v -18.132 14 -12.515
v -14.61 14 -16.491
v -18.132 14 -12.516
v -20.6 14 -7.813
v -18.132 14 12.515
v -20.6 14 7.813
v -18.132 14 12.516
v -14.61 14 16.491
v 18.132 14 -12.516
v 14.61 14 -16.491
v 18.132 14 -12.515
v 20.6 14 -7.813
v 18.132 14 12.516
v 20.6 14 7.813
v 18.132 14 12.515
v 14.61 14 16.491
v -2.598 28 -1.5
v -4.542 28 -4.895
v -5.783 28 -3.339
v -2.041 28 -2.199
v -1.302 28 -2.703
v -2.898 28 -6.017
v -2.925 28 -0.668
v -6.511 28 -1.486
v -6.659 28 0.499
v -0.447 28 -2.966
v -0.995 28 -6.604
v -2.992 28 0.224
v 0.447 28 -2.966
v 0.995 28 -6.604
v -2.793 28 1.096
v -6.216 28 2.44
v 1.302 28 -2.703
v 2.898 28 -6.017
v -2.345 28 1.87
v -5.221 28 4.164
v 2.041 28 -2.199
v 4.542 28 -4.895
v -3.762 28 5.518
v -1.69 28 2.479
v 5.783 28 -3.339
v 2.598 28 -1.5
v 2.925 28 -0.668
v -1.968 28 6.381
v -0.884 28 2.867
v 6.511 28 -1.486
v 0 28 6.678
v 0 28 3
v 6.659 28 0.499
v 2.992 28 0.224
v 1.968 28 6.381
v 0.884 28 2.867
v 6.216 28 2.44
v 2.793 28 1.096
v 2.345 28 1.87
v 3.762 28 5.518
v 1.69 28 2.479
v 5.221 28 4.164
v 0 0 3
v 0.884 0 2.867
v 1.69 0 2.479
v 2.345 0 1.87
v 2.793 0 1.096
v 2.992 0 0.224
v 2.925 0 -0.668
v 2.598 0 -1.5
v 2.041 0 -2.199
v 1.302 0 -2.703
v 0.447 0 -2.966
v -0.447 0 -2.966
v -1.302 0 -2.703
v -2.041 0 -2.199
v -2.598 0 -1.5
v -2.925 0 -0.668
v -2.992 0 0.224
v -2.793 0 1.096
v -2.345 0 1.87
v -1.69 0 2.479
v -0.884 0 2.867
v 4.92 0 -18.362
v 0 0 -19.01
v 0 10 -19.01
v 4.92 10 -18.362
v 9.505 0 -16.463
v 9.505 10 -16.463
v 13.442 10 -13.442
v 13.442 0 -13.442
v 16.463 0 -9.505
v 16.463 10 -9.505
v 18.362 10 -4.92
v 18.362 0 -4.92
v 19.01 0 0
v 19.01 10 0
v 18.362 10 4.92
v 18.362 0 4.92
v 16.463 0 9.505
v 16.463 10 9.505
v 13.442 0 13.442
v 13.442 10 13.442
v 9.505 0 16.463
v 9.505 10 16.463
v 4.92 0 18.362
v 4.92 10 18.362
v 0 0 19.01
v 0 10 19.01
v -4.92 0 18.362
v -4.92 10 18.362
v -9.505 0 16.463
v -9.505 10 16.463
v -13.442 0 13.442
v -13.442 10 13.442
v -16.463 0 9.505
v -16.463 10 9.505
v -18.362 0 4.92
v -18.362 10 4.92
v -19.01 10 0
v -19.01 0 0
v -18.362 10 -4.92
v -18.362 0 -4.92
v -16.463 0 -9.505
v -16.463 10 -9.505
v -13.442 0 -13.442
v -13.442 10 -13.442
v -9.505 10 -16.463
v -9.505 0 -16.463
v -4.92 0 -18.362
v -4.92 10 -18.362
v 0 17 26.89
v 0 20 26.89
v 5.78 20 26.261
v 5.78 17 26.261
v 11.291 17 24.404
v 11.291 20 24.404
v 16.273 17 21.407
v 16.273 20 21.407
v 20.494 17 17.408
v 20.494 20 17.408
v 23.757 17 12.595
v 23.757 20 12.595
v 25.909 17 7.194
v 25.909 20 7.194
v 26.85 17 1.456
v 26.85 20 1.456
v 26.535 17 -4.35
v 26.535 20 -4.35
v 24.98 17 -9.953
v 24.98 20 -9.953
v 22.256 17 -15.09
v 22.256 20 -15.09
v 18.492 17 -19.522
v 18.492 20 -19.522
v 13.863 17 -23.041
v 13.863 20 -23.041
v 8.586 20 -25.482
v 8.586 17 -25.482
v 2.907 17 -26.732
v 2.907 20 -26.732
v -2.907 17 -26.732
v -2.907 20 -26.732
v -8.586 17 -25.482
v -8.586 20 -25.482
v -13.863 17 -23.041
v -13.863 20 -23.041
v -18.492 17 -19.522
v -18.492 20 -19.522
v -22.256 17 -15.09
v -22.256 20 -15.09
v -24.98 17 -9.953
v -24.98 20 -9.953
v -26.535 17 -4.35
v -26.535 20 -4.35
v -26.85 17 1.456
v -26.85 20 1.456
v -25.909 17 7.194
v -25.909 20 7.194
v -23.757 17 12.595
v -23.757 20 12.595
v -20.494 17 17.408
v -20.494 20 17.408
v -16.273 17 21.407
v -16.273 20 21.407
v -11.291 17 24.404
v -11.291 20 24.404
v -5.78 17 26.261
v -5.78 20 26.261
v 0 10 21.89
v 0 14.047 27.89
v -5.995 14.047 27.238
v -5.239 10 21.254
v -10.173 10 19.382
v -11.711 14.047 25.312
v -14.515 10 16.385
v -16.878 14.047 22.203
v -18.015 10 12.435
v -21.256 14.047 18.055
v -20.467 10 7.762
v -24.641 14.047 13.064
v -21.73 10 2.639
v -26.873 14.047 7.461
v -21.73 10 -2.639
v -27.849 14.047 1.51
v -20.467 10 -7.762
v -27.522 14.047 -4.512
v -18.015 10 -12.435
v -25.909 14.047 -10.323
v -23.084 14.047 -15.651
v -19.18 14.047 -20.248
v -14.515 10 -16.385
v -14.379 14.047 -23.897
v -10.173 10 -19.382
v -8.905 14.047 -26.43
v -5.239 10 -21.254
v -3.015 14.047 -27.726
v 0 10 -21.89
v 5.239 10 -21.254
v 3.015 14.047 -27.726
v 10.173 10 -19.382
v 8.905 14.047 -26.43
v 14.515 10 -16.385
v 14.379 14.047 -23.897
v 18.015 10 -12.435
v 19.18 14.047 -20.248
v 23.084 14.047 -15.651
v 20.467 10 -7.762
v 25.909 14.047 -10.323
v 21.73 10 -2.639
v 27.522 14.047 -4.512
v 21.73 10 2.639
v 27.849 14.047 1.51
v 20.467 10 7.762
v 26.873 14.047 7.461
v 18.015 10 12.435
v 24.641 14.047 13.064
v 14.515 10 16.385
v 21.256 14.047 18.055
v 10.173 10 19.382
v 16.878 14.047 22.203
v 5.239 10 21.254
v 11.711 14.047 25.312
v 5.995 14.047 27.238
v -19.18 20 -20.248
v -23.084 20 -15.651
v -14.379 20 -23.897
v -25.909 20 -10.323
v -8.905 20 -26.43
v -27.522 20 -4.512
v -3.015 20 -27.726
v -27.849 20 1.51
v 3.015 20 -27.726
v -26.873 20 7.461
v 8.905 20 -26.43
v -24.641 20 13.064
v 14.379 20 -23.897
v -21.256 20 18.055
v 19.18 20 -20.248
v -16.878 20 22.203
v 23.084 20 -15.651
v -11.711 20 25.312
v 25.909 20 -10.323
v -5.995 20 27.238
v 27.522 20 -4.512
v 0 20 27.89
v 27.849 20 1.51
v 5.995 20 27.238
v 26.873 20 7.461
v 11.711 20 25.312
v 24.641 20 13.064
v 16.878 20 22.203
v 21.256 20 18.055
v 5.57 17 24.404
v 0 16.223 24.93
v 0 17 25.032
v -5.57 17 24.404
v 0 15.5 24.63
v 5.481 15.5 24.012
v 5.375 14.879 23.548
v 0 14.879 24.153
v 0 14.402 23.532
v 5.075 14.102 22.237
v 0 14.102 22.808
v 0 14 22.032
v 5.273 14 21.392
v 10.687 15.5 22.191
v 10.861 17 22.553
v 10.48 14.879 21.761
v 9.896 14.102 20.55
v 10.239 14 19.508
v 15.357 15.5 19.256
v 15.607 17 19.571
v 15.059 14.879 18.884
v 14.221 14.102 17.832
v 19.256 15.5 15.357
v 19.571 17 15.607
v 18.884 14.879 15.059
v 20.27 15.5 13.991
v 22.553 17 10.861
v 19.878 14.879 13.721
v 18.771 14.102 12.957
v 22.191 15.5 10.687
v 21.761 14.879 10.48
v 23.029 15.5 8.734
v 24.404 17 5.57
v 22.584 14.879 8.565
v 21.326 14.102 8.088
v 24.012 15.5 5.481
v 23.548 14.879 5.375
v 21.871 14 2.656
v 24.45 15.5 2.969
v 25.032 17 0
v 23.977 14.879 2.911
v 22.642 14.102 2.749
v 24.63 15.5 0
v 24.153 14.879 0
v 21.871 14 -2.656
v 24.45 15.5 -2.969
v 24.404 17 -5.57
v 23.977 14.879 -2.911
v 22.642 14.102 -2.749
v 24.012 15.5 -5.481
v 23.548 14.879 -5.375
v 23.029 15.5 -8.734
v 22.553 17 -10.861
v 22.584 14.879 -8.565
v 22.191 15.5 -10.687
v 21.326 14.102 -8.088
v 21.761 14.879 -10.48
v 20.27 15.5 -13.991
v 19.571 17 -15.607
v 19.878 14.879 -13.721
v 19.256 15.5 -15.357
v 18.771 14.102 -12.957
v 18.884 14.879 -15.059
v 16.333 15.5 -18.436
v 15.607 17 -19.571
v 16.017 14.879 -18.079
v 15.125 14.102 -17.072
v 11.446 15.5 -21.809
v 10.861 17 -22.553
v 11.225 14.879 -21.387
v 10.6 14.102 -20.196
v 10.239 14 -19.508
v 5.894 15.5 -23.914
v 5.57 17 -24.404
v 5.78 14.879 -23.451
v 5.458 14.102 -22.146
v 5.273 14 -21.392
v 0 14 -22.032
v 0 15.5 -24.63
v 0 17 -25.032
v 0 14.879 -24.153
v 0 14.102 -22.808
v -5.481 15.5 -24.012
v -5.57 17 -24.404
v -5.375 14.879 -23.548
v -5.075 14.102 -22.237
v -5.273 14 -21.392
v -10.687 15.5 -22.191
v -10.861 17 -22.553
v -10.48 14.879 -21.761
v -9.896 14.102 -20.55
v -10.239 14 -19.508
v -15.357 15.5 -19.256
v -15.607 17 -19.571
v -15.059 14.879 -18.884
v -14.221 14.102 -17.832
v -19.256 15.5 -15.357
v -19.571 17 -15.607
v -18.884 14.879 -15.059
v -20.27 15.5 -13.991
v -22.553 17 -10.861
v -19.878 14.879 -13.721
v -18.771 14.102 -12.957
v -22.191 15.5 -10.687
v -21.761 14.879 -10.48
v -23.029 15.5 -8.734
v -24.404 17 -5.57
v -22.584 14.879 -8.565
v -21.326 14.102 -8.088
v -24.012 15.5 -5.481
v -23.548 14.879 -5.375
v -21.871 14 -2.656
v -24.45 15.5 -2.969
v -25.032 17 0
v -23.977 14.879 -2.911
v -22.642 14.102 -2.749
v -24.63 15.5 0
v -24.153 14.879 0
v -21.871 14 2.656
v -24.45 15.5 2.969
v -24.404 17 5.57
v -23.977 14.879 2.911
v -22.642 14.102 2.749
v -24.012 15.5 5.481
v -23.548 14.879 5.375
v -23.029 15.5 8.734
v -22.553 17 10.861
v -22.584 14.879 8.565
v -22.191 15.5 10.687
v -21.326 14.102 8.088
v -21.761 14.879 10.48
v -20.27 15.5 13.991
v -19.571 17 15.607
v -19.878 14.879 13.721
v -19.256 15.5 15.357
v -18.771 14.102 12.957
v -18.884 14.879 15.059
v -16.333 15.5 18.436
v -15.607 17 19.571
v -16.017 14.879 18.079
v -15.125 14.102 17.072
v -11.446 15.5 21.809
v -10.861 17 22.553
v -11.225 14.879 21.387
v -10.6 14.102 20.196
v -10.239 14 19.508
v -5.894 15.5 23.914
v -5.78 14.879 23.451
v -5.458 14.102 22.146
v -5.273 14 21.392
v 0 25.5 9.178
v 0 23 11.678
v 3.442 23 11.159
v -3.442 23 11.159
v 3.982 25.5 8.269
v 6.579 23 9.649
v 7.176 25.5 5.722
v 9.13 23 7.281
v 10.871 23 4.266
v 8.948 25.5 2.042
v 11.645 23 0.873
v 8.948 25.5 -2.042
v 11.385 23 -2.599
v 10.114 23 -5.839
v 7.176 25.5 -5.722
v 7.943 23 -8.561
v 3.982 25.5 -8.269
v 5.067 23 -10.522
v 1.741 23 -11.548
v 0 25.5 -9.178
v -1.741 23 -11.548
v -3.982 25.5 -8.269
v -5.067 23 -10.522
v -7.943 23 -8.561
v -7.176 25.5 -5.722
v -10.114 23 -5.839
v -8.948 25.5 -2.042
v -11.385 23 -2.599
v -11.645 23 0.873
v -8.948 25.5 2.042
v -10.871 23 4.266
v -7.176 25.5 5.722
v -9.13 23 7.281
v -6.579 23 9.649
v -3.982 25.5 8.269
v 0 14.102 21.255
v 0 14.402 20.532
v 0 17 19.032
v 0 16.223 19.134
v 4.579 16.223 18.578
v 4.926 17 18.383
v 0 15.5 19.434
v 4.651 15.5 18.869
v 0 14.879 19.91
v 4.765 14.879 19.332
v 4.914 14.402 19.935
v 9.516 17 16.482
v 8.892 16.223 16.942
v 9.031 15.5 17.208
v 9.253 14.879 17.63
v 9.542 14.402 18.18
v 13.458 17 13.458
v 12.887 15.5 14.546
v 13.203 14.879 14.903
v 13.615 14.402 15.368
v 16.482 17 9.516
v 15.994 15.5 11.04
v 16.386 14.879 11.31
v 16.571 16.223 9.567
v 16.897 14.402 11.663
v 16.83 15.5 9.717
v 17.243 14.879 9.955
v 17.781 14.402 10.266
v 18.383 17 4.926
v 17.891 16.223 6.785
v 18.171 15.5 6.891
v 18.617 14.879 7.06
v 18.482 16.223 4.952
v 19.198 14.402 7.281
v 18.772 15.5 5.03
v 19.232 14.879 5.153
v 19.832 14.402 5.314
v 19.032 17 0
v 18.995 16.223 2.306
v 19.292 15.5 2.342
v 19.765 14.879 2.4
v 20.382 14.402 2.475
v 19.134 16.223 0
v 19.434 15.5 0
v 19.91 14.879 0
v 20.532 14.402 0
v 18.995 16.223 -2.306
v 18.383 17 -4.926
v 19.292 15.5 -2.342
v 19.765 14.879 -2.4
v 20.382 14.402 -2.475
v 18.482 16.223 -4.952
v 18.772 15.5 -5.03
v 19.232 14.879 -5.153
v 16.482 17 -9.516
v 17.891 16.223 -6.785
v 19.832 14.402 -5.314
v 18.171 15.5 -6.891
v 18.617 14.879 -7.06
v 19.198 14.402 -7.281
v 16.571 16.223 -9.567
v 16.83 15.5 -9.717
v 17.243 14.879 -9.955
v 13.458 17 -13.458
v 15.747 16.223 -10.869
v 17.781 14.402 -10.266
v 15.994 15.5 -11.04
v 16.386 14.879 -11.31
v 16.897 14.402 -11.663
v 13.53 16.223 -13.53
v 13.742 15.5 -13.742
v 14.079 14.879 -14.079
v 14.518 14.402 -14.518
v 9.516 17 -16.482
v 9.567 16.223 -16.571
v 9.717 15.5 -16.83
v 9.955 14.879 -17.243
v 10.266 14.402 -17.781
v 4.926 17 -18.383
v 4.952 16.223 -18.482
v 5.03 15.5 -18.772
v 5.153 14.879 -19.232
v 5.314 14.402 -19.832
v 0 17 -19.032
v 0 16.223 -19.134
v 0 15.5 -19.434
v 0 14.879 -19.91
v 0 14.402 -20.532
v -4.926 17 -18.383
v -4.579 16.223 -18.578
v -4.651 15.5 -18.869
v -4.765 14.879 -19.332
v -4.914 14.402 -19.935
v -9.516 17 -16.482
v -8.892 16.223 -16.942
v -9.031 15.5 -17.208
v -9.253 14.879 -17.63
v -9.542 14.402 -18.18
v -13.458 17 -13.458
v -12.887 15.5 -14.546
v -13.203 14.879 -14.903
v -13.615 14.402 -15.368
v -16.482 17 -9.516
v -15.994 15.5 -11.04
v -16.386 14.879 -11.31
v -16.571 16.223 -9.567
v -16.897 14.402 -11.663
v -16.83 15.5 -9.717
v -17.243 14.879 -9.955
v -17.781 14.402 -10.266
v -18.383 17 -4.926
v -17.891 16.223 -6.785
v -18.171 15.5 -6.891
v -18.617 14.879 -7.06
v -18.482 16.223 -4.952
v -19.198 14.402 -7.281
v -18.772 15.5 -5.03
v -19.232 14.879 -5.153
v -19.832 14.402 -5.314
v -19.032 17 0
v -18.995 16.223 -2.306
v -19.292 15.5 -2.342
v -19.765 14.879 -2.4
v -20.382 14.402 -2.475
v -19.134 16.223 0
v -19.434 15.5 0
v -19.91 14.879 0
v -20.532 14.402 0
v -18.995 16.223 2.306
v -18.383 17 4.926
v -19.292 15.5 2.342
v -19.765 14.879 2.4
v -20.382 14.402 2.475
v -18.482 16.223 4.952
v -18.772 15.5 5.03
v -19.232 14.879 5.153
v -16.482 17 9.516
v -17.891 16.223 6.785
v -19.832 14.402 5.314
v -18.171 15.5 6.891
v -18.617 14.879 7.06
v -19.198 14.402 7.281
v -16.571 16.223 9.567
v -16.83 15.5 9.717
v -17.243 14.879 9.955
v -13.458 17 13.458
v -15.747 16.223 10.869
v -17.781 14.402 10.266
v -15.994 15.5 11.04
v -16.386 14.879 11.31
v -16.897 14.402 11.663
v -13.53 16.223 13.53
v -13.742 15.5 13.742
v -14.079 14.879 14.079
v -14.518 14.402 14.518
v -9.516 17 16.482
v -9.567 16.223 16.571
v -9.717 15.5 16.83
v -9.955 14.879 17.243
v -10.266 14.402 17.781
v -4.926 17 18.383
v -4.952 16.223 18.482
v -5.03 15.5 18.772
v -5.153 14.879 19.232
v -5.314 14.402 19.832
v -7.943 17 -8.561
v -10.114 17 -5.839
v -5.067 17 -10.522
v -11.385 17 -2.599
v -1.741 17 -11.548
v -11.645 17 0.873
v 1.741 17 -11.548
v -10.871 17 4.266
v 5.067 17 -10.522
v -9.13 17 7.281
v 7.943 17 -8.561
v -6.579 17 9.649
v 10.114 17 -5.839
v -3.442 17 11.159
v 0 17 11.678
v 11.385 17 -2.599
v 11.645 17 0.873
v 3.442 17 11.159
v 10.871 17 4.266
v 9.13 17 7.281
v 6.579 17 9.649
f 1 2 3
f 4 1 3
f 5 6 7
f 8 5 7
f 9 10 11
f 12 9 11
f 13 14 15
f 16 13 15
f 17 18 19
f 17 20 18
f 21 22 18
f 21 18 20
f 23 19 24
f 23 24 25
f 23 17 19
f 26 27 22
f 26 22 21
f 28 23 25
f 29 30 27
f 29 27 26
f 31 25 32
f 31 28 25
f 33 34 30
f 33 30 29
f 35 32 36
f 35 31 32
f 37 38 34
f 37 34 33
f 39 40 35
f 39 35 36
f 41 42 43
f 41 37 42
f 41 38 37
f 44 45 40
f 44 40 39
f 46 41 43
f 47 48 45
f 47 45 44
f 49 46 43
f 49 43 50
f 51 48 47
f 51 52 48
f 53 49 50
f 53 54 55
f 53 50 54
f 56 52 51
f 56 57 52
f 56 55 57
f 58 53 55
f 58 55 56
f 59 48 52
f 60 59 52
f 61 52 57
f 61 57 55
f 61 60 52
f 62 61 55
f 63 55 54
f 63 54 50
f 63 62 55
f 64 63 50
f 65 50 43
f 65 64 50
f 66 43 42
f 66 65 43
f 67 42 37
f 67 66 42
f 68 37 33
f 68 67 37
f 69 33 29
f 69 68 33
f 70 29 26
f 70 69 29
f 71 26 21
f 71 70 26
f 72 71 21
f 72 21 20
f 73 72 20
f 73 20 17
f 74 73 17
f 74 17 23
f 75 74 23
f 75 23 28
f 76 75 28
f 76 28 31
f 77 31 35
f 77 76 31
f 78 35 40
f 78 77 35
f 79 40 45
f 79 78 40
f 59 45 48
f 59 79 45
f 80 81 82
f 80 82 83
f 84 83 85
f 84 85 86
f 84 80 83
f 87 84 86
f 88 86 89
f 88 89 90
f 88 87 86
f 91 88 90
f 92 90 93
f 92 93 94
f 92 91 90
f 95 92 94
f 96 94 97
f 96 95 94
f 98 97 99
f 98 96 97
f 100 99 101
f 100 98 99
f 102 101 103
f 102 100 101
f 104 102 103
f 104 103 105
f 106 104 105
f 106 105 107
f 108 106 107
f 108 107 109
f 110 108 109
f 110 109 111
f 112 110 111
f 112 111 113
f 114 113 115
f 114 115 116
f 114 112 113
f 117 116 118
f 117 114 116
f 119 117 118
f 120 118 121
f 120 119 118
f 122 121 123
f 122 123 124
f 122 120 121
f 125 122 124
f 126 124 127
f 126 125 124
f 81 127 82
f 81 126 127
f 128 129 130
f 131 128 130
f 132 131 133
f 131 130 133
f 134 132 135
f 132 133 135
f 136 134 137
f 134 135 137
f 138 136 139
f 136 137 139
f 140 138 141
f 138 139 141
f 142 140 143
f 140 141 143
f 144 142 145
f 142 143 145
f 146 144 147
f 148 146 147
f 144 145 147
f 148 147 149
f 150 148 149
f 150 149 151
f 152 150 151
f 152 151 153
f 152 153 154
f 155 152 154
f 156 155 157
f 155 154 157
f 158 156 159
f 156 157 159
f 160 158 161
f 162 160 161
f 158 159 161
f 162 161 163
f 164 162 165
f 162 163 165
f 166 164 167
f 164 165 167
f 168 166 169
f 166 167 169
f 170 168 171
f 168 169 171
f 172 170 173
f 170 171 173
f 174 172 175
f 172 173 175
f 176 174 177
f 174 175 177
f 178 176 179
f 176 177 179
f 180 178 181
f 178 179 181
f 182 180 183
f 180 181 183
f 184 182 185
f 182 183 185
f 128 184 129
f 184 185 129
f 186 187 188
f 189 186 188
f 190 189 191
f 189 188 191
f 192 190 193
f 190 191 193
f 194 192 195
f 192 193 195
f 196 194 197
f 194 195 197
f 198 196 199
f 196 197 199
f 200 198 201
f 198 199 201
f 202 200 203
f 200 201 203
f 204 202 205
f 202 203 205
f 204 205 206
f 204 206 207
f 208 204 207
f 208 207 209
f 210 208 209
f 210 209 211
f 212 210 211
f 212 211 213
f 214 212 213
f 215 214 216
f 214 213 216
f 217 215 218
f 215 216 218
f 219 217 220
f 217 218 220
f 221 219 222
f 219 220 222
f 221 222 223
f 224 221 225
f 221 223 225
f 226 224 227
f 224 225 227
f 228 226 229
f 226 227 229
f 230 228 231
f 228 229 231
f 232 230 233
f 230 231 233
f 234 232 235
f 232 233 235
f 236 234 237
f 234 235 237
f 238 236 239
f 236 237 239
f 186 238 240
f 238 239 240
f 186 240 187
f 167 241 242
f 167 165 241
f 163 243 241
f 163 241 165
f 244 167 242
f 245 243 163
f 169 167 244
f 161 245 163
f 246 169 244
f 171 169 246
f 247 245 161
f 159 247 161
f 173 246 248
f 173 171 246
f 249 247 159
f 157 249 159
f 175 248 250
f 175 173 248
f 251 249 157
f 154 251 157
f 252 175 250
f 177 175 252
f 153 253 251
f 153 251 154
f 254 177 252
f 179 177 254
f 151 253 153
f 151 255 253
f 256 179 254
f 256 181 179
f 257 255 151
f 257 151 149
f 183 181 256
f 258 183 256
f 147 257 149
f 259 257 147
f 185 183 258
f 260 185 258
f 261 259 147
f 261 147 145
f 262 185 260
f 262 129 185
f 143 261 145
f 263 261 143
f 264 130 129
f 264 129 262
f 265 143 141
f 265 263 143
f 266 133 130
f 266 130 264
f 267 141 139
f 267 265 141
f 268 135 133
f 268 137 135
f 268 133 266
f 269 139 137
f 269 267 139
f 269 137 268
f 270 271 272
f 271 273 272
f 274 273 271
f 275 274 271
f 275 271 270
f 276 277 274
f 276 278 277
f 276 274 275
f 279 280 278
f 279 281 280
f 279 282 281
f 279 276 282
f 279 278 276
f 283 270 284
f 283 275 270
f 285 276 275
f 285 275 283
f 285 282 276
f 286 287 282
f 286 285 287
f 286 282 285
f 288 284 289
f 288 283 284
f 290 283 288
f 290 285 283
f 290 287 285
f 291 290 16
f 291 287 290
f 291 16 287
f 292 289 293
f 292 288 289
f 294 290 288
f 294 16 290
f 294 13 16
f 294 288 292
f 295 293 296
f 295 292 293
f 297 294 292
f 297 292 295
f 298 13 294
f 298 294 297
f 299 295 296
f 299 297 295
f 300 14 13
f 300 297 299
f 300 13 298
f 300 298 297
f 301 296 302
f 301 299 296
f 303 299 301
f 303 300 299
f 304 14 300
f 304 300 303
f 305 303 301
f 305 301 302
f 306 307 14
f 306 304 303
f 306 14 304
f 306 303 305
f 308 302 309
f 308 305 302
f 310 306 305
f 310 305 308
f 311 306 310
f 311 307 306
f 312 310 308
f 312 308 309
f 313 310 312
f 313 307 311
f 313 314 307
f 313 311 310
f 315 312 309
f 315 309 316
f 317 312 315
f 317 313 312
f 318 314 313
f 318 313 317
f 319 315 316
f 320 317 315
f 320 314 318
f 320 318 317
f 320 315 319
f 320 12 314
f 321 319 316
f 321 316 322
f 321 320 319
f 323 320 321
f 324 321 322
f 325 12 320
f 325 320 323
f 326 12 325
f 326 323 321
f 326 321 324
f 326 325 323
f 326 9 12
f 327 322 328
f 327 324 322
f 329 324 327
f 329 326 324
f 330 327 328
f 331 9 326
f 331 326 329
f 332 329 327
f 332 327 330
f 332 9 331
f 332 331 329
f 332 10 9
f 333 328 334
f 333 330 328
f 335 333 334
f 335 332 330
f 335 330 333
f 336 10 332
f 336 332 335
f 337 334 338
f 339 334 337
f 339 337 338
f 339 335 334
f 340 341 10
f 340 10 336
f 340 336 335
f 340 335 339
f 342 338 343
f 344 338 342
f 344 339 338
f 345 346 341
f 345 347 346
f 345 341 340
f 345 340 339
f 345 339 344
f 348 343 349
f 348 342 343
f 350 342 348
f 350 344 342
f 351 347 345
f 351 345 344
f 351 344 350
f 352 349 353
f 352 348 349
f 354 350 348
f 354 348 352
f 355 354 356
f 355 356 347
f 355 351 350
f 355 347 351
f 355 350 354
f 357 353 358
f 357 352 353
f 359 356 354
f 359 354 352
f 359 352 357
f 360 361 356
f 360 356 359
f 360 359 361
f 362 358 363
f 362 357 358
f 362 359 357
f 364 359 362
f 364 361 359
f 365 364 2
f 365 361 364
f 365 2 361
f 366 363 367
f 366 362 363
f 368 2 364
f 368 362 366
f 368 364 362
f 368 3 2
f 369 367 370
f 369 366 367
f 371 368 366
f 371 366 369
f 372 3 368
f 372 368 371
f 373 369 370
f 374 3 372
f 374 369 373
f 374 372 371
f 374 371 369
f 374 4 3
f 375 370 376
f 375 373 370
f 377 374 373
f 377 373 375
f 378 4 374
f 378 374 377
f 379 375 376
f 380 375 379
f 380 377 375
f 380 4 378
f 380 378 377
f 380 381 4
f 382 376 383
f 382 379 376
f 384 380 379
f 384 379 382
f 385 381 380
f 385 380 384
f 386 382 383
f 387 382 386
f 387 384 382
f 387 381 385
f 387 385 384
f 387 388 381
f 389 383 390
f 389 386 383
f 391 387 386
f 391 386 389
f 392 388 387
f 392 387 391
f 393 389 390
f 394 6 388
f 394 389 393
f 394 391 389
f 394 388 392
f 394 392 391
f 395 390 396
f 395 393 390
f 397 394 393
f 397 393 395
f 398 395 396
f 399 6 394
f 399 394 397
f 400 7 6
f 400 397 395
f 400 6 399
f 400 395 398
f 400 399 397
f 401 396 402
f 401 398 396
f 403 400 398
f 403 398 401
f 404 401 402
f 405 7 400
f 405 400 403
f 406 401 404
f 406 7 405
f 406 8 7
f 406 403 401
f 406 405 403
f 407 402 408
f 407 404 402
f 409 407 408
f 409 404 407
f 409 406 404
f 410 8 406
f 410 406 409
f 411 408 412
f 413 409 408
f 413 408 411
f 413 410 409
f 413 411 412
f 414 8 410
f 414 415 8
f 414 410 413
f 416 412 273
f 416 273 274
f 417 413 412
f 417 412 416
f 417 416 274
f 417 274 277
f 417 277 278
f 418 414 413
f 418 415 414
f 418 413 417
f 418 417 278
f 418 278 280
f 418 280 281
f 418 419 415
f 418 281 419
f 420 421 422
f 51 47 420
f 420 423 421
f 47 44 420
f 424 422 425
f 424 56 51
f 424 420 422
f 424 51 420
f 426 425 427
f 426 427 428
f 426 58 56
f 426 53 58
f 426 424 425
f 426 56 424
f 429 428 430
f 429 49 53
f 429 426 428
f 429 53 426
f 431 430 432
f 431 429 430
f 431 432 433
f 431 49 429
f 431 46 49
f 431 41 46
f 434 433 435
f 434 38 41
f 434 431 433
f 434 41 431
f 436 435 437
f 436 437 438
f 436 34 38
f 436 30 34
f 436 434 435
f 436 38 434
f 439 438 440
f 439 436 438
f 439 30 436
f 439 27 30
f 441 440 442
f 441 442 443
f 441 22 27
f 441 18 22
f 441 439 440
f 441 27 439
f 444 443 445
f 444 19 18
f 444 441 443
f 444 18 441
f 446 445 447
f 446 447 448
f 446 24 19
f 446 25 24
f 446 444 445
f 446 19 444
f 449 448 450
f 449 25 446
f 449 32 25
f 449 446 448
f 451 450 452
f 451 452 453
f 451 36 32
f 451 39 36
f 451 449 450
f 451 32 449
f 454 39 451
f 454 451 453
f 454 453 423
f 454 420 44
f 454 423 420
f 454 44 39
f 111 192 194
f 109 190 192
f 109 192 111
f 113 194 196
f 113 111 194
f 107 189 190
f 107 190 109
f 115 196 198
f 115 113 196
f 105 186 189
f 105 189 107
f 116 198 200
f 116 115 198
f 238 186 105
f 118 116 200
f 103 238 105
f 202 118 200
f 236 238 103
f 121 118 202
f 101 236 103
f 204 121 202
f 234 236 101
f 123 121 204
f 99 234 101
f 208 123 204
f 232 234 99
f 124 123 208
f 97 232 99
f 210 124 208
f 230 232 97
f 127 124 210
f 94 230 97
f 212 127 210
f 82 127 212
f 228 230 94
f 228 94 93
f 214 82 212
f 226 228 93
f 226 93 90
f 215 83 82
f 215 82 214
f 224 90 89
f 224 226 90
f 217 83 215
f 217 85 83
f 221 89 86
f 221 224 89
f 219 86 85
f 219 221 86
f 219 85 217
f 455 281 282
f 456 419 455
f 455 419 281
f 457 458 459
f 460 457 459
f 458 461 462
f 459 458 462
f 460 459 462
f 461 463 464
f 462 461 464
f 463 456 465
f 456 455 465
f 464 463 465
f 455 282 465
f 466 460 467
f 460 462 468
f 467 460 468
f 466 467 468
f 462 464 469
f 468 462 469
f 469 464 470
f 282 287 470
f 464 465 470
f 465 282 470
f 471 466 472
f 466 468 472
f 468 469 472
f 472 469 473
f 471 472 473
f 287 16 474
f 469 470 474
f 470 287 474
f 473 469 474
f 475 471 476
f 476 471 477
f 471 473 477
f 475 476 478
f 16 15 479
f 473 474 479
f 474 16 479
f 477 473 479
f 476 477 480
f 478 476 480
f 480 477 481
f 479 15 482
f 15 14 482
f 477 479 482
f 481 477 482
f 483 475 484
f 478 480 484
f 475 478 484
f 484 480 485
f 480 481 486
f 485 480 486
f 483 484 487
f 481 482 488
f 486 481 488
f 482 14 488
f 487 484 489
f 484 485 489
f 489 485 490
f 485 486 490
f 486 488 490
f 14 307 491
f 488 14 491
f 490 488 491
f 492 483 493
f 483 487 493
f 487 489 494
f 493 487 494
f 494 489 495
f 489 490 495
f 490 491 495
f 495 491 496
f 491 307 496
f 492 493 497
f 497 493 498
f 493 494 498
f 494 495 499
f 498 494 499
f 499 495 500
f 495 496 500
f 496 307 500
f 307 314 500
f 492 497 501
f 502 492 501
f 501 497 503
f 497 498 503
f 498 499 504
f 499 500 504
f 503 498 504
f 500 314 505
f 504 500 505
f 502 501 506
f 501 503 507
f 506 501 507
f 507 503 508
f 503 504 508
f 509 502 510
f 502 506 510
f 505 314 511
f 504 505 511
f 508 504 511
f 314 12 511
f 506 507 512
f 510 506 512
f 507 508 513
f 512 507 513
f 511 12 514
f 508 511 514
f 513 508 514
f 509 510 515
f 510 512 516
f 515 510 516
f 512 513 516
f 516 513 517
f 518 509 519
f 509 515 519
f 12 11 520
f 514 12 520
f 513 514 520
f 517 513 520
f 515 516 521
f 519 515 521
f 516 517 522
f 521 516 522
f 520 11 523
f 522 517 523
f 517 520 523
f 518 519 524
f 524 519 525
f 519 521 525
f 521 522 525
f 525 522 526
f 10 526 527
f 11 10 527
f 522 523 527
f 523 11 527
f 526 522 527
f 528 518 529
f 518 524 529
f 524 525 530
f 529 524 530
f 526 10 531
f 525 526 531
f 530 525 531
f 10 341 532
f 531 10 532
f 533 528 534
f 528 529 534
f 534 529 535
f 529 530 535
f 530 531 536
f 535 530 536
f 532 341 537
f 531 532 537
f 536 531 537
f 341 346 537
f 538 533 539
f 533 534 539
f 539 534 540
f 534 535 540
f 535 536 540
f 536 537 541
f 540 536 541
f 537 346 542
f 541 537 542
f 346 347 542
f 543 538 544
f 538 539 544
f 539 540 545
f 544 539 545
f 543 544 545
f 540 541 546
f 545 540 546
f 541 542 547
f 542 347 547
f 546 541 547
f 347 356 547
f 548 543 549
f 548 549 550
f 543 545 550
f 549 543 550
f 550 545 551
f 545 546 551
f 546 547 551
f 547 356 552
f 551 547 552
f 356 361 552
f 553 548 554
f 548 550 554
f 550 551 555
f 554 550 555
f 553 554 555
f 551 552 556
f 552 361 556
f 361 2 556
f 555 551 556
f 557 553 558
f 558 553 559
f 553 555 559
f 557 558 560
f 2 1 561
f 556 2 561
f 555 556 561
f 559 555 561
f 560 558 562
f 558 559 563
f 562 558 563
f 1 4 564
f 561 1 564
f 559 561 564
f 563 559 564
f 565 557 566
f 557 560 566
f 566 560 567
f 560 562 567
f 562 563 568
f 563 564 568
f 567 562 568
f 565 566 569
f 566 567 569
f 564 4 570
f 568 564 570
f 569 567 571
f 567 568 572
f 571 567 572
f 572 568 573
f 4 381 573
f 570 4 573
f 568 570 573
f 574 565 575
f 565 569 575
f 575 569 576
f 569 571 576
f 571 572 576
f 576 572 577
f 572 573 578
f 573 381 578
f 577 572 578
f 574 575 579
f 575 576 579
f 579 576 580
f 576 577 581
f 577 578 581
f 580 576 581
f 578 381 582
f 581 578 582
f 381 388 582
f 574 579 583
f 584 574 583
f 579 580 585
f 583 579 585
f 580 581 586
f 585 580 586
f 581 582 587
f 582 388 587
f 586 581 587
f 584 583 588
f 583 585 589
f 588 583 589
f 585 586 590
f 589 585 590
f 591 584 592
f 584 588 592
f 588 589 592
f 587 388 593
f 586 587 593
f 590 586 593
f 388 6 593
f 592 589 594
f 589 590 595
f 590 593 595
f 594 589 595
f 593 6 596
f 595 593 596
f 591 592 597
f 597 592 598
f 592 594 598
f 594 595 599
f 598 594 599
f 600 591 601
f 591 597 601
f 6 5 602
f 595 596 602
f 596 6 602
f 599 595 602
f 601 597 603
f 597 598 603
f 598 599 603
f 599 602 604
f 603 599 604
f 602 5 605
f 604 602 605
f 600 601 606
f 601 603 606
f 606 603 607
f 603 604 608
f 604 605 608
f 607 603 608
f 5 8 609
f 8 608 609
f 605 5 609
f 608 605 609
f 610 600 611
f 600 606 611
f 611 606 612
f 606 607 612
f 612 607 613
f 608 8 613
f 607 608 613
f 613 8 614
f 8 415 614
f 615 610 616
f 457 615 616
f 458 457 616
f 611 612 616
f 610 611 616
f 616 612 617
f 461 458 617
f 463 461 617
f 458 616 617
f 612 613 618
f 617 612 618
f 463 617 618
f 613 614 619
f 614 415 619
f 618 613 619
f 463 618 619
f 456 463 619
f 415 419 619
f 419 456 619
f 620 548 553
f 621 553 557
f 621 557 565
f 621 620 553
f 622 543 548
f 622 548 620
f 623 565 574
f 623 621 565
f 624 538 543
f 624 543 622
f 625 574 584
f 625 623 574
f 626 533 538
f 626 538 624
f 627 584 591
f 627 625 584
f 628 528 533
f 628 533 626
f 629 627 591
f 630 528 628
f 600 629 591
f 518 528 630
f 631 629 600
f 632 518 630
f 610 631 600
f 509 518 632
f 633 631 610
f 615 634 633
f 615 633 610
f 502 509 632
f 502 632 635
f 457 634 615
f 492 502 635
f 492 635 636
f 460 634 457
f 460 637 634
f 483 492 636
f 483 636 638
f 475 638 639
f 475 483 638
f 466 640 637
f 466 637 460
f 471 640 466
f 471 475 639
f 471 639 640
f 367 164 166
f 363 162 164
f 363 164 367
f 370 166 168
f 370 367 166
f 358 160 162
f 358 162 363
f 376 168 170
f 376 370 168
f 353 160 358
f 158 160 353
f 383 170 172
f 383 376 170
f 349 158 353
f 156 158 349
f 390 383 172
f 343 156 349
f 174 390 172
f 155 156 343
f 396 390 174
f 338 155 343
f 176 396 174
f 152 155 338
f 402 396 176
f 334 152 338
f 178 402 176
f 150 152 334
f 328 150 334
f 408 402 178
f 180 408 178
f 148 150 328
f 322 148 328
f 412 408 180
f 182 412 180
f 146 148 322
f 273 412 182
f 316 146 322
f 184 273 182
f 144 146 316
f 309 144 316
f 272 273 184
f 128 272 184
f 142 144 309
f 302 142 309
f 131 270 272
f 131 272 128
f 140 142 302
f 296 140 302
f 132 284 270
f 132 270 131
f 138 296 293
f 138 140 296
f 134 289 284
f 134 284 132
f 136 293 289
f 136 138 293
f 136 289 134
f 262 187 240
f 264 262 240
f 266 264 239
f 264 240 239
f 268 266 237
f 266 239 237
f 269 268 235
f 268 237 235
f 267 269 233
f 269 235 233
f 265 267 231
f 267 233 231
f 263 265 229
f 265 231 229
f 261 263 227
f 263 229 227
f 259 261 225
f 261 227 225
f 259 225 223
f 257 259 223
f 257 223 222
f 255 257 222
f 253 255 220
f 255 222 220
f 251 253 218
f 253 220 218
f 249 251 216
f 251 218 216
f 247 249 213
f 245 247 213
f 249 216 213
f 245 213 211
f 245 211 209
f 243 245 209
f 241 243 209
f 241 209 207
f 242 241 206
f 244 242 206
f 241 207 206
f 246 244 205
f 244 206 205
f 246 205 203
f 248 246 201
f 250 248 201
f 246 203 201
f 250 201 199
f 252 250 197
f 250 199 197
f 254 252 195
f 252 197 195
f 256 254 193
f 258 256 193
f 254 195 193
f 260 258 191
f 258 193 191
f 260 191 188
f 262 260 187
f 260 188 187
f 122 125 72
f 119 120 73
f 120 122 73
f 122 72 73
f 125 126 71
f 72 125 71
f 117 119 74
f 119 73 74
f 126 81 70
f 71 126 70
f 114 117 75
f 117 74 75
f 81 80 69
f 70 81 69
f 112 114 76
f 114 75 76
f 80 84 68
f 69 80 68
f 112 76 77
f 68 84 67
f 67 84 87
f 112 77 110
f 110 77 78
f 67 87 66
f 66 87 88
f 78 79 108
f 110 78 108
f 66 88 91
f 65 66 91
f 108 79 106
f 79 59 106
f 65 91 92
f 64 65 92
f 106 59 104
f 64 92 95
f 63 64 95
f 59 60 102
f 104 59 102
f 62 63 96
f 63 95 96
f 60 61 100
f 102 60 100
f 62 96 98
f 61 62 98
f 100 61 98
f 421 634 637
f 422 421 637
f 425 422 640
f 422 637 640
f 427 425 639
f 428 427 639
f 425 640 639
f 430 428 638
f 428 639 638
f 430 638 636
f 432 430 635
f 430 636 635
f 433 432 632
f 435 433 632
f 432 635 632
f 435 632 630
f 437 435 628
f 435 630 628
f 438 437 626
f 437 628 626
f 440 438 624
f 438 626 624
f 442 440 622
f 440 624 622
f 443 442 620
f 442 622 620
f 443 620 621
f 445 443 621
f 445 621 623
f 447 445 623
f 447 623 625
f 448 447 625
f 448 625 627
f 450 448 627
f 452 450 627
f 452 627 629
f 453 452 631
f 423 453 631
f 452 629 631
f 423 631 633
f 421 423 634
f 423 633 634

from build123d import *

# Parameters (mm, degrees)
SKETCH1_R           = 27.889608224
SKETCH1_R_2         = 3
BOSS_EXTRUDE1_DEPTH = 20
SKETCH2_R           = 26.889608224
CUT_EXTRUDE1_DEPTH  = 3
SKETCH2_5_R         = 25.031826588
SKETCH2_5_R_2       = 19.031826588
CUT_EXTRUDE2_DEPTH  = 6
FILLET1_R           = 3
SKETCH4_R           = 11.678118969
SKETCH4_R_2         = 3
BOSS_EXTRUDE2_DEPTH = 11
CHAMFER1_SIZE       = 5
SKETCH5_R           = 27.889608224
SKETCH5_R_2         = 19.009910513
CUT_EXTRUDE3_DEPTH  = 10
CHAMFER2_SIZE       = 6
CHAMFER2_SIZE2      = 4.047051101


with BuildPart() as part:
    # Sketch1 → Boss-Extrude1 (new body)
    with BuildSketch(Plane(origin=(0, 0, 0), x_dir=(1, 0, 0), z_dir=(0, 1, 0))):
        with Locations(Location((0, 0, 0), (0, 0, 270))):
            Circle(SKETCH1_R)
        with Locations(Location((0, 0, 0), (0, 0, 270))):
            Circle(SKETCH1_R_2, mode=Mode.SUBTRACT)
    extrude(amount=BOSS_EXTRUDE1_DEPTH)

    # Sketch2 → Cut-Extrude1 (cut)
    with BuildSketch(Plane(origin=(0, 20, 0), x_dir=(1, 0, 0), z_dir=(0, 1, 0))):
        with Locations(Location((0, 0, 0), (0, 0, 270))):
            Circle(SKETCH2_R)
    extrude(amount=-CUT_EXTRUDE1_DEPTH, mode=Mode.SUBTRACT)

    # Sketch2<5> → Cut-Extrude2 (cut)
    with BuildSketch(Plane(origin=(0, 20, 0), x_dir=(1, 0, 0), z_dir=(0, 1, 0))):
        with Locations(Location((0, 0, 0), (0, 0, 270))):
            Circle(SKETCH2_5_R)
        with Locations(Location((0, 0, 0), (0, 0, 270))):
            Circle(SKETCH2_5_R_2, mode=Mode.SUBTRACT)
    extrude(amount=-CUT_EXTRUDE2_DEPTH, mode=Mode.SUBTRACT)

    # Fillet1
    fillet1_edges = [part.edges().sort_by_distance(p)[0] for p in [
        (0, 14, -25.031826588),
        (0, 14, -19.031826588),
    ]]
    fillet(fillet1_edges, radius=FILLET1_R - 0.0001)  # a hair under: the kernel refuses the full size

    # Sketch4 → Boss-Extrude2 (add)
    with BuildSketch(Plane(origin=(0, 17, 0), x_dir=(1, 0, 0), z_dir=(0, 1, 0))):
        with Locations(Location((0, 0, 0), (0, 0, 270))):
            Circle(SKETCH4_R)
        with Locations(Location((0, 0, 0), (0, 0, 270))):
            Circle(SKETCH4_R_2, mode=Mode.SUBTRACT)
    extrude(amount=BOSS_EXTRUDE2_DEPTH)

    # Chamfer1
    chamfer1_edges = [part.edges().sort_by_distance(p)[0] for p in [
        (0, 28, -11.678118969),
    ]]
    chamfer(chamfer1_edges, length=CHAMFER1_SIZE)

    # Sketch5 → Cut-Extrude3 (cut)
    with BuildSketch(Plane.XZ):
        with Locations(Location((0, 0, 0), (0, 0, 270))):
            Circle(SKETCH5_R)
        with Locations(Location((0, 0, 0), (0, 0, 270))):
            Circle(SKETCH5_R_2, mode=Mode.SUBTRACT)
    extrude(amount=-CUT_EXTRUDE3_DEPTH, mode=Mode.SUBTRACT)

    # Chamfer2
    chamfer2_edges = [part.edges().sort_by_distance(p)[0] for p in [
        (0, 10, -27.889608224),
    ]]
    chamfer2_side = [part.faces().sort_by_distance(p)[0] for p in [
        (0, 10, -27.10077098),
    ]]
    chamfer(chamfer2_edges, length=CHAMFER2_SIZE, length2=CHAMFER2_SIZE2, reference=chamfer2_side[0])


solid = part.part
